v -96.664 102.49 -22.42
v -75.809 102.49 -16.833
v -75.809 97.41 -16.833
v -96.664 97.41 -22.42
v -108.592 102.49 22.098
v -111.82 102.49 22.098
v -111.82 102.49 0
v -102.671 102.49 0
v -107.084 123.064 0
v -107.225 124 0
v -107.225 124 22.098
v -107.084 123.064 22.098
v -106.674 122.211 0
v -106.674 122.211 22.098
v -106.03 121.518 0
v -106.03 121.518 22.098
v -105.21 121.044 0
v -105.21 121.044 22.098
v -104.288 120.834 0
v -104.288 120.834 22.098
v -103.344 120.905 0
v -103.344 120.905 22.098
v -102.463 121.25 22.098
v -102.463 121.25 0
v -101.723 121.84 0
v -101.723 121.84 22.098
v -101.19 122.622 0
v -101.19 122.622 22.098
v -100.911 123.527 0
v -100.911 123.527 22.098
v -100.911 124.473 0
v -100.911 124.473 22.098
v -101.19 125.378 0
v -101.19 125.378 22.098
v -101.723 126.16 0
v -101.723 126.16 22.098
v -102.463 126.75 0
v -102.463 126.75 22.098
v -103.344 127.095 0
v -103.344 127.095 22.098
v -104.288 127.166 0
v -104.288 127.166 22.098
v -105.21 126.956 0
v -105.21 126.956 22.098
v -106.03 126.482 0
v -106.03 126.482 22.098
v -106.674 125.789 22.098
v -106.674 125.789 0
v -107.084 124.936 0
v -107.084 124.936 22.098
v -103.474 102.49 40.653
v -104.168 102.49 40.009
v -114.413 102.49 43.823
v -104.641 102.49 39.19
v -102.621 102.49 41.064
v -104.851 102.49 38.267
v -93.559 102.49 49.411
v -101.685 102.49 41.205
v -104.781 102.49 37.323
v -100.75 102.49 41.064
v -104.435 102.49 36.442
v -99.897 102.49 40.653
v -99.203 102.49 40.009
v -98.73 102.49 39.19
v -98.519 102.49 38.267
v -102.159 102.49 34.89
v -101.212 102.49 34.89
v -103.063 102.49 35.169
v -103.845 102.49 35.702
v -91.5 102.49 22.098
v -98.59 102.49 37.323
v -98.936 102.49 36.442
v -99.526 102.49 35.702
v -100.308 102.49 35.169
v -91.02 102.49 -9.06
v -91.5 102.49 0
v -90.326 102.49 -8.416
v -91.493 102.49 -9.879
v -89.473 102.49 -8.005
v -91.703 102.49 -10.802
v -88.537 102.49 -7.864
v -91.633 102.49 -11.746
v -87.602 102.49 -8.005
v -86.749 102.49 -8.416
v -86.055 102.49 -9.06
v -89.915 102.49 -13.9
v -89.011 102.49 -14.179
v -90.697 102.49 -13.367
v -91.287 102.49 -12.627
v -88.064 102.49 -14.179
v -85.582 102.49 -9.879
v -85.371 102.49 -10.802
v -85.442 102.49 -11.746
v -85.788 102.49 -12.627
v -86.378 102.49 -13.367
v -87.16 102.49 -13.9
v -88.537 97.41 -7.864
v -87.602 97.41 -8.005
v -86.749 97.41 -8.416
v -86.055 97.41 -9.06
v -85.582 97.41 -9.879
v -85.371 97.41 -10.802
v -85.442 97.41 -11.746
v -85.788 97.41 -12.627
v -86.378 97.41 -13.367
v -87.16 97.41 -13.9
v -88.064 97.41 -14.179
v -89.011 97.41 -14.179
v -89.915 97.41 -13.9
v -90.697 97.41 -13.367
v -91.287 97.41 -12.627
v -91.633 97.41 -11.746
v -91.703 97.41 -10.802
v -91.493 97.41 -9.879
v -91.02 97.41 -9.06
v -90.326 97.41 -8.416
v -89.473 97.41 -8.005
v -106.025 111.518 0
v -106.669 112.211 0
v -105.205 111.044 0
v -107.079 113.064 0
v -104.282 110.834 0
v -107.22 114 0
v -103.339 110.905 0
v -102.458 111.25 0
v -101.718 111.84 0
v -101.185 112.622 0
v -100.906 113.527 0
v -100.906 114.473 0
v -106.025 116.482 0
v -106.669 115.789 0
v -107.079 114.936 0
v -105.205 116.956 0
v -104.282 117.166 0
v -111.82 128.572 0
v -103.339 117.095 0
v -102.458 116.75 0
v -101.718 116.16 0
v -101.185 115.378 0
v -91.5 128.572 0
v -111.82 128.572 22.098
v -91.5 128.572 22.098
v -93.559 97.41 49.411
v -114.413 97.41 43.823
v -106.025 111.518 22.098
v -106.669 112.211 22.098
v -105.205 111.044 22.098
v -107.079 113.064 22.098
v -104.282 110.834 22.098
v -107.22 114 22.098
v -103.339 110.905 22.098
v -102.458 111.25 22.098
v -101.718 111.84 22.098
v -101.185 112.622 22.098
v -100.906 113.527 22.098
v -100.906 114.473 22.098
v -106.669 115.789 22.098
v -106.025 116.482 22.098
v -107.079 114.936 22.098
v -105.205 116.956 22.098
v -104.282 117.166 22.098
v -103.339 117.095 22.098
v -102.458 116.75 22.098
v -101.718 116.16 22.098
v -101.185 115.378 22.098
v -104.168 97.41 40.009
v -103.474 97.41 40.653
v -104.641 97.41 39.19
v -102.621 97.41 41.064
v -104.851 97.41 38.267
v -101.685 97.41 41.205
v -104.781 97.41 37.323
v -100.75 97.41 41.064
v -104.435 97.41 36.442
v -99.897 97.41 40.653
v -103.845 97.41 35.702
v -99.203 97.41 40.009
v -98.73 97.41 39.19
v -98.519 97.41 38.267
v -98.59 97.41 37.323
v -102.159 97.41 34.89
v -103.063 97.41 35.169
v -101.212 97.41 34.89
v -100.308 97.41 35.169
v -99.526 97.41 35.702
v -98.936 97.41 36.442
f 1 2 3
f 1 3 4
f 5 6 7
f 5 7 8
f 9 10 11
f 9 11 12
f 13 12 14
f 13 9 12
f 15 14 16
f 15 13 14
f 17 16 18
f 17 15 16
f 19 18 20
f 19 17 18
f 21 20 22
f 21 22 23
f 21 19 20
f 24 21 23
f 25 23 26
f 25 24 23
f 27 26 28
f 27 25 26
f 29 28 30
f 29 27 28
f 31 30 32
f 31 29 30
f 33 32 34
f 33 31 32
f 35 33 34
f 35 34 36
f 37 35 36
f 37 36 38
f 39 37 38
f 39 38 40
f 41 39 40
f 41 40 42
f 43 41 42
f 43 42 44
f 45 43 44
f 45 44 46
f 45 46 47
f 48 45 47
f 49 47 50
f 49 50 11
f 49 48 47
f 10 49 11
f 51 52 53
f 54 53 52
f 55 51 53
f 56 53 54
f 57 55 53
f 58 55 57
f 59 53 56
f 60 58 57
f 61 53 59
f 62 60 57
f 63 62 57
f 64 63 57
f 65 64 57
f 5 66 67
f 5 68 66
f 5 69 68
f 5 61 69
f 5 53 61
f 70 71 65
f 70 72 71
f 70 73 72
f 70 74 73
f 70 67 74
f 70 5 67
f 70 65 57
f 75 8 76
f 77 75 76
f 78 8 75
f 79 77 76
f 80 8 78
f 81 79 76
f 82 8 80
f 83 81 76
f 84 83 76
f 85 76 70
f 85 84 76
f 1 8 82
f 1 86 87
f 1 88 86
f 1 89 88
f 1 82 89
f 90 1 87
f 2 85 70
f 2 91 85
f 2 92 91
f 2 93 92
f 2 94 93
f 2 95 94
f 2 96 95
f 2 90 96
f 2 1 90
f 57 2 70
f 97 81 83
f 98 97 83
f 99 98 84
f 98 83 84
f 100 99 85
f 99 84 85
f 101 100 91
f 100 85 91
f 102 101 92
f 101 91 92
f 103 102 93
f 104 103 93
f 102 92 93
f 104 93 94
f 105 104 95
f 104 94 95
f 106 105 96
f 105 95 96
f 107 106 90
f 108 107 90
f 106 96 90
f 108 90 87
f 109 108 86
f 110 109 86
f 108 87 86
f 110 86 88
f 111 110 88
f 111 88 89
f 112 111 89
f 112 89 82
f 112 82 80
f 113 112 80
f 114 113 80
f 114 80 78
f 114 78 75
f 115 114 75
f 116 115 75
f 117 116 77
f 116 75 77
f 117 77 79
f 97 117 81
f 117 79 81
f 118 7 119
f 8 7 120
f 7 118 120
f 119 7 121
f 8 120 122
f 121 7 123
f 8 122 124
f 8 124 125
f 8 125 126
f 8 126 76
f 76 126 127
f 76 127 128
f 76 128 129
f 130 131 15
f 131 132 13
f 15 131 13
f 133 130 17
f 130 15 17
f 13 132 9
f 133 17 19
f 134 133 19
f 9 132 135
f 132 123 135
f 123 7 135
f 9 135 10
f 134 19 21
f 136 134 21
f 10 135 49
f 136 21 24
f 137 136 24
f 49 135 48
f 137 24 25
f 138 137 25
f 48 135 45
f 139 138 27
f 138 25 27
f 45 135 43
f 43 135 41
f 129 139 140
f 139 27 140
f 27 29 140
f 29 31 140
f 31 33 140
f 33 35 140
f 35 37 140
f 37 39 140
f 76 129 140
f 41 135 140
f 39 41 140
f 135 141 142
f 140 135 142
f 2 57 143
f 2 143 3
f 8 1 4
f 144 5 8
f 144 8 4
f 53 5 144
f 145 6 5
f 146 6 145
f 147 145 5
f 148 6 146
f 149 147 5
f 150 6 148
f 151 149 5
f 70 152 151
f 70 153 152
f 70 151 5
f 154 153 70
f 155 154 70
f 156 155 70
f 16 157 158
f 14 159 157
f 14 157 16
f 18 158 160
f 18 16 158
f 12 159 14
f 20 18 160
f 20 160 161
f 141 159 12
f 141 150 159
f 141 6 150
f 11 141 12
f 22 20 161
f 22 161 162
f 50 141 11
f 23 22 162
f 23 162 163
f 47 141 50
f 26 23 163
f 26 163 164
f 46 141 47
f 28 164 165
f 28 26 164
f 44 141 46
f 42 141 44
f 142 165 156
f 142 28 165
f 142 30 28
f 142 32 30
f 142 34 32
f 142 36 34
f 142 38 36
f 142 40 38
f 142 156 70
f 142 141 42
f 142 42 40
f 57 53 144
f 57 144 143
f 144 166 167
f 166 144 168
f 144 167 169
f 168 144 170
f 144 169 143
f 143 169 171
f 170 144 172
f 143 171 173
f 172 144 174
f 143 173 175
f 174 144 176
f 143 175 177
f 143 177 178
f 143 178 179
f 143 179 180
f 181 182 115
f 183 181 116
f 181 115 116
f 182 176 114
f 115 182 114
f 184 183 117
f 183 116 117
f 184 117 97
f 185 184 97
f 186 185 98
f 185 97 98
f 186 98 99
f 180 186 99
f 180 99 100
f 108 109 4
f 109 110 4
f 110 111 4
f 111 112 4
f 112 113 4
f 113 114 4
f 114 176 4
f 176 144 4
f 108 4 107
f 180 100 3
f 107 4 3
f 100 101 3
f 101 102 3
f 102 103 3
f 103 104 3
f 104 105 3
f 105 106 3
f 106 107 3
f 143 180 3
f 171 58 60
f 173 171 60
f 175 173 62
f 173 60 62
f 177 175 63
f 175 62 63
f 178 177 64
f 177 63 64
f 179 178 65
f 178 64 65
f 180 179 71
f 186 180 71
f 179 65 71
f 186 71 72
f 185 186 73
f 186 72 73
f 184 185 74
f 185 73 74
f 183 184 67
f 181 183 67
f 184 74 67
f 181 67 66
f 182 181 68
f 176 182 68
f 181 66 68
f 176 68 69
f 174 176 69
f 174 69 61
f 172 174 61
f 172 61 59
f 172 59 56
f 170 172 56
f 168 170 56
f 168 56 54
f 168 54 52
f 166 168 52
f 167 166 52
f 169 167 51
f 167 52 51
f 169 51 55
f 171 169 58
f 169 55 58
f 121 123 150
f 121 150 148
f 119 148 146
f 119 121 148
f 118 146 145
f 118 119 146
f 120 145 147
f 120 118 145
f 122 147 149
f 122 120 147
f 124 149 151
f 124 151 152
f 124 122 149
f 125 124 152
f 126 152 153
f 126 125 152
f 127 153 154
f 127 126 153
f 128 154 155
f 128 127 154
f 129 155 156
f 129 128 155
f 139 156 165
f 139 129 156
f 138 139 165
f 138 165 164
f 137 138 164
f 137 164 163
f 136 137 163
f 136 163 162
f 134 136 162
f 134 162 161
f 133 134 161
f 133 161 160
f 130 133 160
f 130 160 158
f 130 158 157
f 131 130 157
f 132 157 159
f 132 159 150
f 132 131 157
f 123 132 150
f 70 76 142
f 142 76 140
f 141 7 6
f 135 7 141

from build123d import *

# Parameters (mm, degrees)
SKETCH1_W           = 20.32
SKETCH1_H           = 26.081708108
SKETCH1_R           = 3.175
BOSS_EXTRUDE1_DEPTH = 22.098
SKETCH2_R           = 3.175
BOSS_EXTRUDE2_DEPTH = 5.08


with BuildPart() as part:
    # Sketch1 → Boss-Extrude1 (new body)
    with BuildSketch(Plane.XY):
        with Locations((-101.659894533, 115.530854428)):
            Rectangle(SKETCH1_W, SKETCH1_H)
        with Locations(Location((-104.04520642, 114, 0), (0, 0, 180))):
            Circle(SKETCH1_R, mode=Mode.SUBTRACT)
        with Locations(Location((-104.05047074, 124, 0), (0, 0, 180))):
            Circle(SKETCH1_R, mode=Mode.SUBTRACT)
    extrude(amount=BOSS_EXTRUDE1_DEPTH)

    # Sketch2 → Boss-Extrude2 (add)
    with BuildSketch(Plane(origin=(0, 102.490000374, 0), x_dir=(1, 0, 0), z_dir=(0, 1, 0))):
        Polygon((-96.663626928, 22.420429911), (-114.413437041, -43.822763256), (-93.559098452, -49.410666439), (-75.809288339, 16.832526727), align=None)
        with Locations(Location((-101.685366436, -38.029634252, 0), (0, 0, 270))):
            Circle(SKETCH2_R, mode=Mode.SUBTRACT)
        with Locations(Location((-88.537358944, 11.039397724, 0), (0, 0, 270))):
            Circle(SKETCH2_R, mode=Mode.SUBTRACT)
    extrude(amount=-BOSS_EXTRUDE2_DEPTH)


solid = part.part
